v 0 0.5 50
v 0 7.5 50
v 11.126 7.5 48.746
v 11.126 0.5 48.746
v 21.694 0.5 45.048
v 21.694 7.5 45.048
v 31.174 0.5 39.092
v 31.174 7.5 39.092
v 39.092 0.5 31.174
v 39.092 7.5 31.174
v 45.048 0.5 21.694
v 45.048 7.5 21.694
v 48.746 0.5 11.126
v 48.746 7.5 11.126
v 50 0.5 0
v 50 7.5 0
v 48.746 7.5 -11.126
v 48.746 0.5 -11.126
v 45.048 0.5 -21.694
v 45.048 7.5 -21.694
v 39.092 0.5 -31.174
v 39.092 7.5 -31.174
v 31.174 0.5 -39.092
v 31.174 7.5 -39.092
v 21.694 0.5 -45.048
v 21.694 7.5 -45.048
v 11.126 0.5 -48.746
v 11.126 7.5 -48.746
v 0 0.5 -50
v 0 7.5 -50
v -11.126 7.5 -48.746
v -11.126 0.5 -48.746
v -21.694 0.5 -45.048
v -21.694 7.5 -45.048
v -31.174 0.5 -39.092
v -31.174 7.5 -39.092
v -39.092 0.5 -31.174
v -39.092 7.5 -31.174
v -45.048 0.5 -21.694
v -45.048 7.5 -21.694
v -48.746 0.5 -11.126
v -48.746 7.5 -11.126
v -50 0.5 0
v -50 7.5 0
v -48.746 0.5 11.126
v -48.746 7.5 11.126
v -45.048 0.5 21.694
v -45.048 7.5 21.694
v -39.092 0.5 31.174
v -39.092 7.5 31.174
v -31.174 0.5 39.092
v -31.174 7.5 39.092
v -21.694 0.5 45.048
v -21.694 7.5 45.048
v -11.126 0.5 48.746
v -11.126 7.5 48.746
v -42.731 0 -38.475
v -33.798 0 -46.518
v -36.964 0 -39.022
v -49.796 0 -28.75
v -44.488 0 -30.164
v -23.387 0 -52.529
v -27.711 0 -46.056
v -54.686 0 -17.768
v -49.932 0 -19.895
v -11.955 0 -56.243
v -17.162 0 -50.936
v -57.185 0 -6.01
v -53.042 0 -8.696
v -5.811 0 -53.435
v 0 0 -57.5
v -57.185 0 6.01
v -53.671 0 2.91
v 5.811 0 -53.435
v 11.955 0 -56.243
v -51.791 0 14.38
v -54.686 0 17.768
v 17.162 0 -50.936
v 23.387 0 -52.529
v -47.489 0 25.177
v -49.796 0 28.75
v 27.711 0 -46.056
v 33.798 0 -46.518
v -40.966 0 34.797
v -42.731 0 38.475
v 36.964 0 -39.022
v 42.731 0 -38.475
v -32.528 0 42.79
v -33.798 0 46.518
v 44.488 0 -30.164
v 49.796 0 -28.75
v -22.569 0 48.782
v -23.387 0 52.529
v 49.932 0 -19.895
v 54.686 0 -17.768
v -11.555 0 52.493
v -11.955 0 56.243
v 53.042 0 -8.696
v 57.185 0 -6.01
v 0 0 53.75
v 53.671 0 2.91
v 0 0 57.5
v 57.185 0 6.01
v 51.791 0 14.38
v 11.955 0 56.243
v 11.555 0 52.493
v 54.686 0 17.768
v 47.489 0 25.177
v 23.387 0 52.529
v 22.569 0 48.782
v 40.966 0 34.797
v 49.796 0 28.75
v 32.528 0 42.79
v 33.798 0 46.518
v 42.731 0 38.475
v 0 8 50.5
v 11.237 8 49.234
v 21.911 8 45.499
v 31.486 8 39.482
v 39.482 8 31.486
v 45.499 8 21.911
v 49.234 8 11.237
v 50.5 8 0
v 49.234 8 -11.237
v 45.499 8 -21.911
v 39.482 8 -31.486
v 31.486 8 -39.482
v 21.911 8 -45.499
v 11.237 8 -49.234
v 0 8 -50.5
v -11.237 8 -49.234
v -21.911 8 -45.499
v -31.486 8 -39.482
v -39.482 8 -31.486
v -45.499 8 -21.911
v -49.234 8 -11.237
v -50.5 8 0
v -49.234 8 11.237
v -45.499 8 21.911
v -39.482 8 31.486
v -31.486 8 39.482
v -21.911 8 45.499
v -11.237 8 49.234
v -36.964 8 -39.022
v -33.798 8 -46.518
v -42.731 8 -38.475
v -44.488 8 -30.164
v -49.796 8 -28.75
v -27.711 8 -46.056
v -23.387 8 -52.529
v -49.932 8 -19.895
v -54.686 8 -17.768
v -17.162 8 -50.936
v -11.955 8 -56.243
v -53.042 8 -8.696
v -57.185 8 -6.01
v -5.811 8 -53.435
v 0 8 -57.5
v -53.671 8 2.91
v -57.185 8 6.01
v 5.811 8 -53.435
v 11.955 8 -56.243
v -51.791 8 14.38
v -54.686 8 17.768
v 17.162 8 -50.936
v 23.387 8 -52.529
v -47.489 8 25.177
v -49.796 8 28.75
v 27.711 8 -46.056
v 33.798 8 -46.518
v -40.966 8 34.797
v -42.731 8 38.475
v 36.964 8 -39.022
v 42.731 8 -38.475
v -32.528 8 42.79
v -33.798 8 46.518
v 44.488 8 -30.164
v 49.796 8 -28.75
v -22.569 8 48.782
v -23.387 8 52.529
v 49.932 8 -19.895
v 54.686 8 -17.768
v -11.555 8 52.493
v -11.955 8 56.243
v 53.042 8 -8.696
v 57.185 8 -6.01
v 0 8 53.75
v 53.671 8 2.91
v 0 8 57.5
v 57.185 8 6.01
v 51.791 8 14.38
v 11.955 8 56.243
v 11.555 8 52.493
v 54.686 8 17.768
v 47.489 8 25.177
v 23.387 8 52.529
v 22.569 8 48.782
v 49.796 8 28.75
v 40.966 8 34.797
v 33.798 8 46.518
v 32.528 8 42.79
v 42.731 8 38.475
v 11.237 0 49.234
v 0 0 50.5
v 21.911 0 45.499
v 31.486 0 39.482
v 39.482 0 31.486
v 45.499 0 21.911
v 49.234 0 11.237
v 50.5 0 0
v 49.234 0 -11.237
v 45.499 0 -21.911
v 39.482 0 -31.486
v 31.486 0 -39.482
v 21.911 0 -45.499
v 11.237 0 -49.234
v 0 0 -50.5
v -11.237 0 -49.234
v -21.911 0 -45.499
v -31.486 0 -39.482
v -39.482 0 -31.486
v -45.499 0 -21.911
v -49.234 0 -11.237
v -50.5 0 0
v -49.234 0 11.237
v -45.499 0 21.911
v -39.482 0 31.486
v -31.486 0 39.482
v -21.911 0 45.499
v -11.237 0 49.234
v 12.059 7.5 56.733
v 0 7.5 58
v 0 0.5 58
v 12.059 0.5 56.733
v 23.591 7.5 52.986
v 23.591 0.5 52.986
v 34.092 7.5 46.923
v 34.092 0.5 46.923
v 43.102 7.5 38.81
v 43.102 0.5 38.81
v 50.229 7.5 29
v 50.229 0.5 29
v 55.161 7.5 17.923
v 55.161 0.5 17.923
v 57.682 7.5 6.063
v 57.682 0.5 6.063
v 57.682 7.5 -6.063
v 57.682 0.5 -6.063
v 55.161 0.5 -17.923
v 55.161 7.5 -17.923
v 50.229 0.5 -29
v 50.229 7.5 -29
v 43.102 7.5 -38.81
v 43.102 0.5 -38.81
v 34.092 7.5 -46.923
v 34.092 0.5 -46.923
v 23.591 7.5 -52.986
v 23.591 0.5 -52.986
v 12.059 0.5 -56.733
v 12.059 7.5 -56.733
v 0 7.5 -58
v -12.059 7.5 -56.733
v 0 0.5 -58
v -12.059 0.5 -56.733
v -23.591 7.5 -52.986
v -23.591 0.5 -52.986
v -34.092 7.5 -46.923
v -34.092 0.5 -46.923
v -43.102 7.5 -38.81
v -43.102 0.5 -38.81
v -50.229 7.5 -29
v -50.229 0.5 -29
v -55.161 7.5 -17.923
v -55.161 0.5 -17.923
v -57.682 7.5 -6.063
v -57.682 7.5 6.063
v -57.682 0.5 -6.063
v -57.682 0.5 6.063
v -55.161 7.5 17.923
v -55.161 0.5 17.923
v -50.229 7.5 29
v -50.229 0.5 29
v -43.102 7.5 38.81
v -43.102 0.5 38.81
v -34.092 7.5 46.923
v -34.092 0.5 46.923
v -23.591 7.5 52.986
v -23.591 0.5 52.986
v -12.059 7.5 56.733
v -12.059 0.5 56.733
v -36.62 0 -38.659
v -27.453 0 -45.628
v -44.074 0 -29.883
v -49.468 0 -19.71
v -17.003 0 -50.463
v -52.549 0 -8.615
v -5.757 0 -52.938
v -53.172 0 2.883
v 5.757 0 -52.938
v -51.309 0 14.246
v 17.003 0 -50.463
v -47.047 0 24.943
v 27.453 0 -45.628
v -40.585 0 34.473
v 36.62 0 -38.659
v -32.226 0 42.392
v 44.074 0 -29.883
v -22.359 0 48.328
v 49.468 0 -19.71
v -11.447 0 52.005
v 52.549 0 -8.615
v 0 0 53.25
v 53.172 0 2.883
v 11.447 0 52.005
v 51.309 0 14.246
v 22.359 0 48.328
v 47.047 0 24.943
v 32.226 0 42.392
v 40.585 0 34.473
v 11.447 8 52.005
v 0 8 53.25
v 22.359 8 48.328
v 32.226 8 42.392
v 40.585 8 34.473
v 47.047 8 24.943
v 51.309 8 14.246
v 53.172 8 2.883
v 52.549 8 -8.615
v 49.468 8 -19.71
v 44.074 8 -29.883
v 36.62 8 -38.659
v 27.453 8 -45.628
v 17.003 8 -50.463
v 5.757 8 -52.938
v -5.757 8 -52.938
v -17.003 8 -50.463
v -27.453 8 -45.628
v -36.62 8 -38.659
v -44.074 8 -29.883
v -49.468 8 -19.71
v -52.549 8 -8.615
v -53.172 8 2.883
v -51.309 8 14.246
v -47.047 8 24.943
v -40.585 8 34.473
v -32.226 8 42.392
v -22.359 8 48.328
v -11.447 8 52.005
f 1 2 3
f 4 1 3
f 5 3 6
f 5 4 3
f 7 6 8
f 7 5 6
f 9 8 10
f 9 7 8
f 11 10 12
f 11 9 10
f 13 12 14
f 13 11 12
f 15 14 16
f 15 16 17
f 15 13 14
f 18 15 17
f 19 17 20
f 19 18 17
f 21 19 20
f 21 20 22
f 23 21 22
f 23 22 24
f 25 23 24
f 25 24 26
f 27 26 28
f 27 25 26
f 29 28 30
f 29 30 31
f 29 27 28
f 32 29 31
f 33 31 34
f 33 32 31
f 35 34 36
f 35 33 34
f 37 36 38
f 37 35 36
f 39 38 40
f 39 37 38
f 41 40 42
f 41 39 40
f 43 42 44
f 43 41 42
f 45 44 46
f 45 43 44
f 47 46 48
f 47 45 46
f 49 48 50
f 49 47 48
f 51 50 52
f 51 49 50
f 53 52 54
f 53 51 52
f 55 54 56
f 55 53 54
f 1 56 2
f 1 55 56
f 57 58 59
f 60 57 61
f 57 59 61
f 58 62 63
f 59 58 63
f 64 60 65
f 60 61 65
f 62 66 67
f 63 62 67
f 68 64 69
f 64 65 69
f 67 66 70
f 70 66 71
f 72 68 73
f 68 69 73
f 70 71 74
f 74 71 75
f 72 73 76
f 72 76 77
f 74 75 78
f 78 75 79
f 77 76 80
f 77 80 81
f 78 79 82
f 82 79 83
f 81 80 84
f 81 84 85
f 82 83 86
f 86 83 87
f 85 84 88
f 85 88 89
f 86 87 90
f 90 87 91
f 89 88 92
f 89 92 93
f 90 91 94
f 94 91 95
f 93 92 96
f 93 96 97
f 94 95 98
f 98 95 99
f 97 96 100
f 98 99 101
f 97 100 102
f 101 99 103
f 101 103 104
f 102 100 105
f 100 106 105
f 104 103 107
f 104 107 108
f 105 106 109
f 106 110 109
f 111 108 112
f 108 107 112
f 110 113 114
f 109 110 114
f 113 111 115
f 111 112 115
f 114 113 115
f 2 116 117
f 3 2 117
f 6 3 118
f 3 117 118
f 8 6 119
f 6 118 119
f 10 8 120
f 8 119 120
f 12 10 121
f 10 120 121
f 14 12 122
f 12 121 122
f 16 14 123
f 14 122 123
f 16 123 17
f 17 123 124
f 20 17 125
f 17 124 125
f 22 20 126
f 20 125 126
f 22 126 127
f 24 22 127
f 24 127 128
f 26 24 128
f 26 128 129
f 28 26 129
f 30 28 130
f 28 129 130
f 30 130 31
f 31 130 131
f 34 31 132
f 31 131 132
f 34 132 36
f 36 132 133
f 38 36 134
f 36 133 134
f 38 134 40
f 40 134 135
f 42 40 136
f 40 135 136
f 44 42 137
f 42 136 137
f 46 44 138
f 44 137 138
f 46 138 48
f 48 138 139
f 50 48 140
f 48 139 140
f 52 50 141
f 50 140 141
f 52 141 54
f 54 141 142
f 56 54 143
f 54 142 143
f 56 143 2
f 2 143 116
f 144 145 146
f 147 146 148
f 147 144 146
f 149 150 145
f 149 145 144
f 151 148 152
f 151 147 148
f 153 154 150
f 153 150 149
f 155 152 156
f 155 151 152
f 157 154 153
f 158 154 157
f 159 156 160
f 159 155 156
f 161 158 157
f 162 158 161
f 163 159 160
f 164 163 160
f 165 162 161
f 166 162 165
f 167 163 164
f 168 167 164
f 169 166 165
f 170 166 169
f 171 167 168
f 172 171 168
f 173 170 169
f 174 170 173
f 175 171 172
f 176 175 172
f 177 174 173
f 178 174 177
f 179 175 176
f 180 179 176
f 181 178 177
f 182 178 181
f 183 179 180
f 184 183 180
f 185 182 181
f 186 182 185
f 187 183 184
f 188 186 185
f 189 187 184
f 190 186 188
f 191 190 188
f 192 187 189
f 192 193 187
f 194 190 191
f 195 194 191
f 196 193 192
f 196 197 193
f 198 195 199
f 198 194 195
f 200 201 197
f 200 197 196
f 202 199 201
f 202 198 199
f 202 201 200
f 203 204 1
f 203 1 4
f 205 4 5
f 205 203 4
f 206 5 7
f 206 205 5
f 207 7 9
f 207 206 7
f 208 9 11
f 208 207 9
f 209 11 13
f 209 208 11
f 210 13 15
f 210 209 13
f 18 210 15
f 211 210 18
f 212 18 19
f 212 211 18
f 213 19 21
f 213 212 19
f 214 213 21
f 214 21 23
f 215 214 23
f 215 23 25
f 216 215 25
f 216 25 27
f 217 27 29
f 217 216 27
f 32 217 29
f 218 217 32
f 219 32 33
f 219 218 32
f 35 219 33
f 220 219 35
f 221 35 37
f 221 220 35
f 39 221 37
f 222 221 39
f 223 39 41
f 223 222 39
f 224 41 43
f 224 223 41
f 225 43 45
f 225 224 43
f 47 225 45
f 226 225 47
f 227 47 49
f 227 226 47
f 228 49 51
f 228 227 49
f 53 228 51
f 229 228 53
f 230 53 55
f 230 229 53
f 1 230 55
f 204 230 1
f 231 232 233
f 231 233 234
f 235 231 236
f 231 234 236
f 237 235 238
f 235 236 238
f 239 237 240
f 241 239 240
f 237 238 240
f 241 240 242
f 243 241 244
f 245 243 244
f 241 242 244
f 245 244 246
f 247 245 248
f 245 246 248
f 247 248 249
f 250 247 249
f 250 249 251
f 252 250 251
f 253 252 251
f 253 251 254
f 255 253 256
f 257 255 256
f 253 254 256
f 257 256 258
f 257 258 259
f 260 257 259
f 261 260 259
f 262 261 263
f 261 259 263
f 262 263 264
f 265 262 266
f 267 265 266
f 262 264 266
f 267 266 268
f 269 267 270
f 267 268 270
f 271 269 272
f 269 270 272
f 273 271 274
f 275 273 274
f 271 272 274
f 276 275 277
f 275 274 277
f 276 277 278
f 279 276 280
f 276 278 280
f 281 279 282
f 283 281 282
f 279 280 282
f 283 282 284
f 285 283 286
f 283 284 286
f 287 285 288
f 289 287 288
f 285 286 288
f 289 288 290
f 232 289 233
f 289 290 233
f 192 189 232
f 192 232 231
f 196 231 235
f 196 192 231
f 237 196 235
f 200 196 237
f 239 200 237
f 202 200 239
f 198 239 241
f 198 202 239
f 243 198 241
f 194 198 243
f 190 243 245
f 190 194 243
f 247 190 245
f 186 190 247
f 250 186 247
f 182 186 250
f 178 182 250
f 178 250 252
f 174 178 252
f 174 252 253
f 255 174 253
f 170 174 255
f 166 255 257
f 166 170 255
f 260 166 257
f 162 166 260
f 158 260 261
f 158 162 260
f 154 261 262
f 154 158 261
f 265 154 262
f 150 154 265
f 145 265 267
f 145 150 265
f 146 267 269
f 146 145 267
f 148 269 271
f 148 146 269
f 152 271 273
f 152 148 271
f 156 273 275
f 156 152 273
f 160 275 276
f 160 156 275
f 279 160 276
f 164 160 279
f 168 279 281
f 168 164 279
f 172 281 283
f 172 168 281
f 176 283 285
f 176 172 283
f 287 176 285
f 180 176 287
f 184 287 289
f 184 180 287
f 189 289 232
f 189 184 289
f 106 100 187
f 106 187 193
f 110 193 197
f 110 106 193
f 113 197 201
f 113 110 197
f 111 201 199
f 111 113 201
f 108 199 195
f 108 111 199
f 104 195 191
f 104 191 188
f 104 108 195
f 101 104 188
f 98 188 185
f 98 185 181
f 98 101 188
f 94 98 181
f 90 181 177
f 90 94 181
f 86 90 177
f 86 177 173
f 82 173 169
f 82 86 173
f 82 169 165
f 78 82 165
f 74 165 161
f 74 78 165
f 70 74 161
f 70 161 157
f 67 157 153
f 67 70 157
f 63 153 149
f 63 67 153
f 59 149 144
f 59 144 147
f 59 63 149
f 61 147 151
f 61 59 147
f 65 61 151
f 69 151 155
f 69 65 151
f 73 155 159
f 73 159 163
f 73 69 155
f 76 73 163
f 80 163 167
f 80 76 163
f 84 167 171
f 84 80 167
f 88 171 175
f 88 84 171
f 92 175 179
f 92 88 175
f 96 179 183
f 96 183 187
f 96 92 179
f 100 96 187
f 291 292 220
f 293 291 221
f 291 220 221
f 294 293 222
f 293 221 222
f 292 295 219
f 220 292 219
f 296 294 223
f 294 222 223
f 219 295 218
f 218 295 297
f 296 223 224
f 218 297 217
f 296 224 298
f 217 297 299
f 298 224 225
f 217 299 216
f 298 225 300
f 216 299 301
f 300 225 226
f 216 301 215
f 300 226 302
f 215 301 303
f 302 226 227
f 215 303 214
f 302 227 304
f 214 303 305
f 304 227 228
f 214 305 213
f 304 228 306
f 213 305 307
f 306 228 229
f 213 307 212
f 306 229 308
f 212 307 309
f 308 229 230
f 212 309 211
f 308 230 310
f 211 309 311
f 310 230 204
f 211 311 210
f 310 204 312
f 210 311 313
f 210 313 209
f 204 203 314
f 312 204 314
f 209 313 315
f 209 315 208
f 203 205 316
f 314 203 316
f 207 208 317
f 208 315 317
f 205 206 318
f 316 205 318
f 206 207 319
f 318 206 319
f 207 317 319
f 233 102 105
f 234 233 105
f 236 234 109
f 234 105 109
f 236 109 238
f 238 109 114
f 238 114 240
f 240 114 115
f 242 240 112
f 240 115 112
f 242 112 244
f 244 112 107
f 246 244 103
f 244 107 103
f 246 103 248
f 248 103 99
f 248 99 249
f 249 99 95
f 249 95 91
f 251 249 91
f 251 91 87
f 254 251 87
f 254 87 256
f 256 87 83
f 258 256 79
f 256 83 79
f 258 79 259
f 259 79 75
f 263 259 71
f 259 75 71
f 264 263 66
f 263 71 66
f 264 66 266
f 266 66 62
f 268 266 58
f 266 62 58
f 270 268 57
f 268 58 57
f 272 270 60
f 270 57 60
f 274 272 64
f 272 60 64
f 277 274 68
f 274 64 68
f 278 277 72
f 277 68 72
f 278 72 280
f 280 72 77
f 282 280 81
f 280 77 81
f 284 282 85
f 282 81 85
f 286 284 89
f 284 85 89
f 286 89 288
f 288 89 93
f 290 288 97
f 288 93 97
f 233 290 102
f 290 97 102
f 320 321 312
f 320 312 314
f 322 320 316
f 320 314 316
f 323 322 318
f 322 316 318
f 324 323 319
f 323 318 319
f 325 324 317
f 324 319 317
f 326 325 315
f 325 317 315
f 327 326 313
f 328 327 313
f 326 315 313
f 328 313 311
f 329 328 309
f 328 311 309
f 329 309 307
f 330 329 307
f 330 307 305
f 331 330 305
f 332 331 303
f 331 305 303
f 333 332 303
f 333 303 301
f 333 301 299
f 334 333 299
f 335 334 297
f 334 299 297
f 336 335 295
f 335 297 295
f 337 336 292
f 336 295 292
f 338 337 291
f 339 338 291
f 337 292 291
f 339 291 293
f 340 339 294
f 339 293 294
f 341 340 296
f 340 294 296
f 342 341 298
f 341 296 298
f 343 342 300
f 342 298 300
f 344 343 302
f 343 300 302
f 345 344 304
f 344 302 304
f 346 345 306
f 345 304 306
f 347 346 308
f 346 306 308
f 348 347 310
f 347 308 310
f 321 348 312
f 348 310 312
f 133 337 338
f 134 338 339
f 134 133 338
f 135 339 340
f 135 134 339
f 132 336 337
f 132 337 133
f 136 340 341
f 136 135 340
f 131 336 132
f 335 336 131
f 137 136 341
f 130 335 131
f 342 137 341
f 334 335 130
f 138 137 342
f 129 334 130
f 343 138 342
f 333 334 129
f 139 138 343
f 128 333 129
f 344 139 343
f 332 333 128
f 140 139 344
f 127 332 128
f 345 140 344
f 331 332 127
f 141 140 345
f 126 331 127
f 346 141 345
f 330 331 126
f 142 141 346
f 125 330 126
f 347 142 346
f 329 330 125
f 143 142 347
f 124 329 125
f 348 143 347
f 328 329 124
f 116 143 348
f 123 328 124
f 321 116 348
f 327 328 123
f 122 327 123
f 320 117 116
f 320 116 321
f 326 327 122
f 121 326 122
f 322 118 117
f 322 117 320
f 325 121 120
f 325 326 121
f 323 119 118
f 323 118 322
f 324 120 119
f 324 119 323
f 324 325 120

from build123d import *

# Parameters (mm, degrees)
SKETCH_1_R      = 58
SKETCH_1_R_2    = 53.75
EXTRUDE_1_DEPTH = 8
SKETCH_2_R      = 53.25
SKETCH_2_R_2    = 50
EXTRUDE_2_DEPTH = 8
CHAMFER_1_SIZE  = 0.5
CHAMFER_2_SIZE  = 0.5


with BuildPart() as part:
    # 草图1 → 凸台-拉伸1 (new body)
    with BuildSketch(Plane(origin=(0, 0, 0), x_dir=(1, 0, 0), z_dir=(0, 1, 0))):
        with Locations(Location((0, 0, 0), (0, 0, 270))):
            Circle(SKETCH_1_R)
        with Locations(Location((0, 0, 0), (0, 0, 270))):
            Circle(SKETCH_1_R_2, mode=Mode.SUBTRACT)
    extrude(amount=EXTRUDE_1_DEPTH)

    # 倒角1
    chamfer_1_edges = [part.edges().sort_by_distance(p)[0] for p in [
        (0, 0, -58),
        (0, 8, -58),
    ]]
    chamfer(chamfer_1_edges, length=CHAMFER_1_SIZE)


with BuildPart() as body_2:
    # 草图2 → 凸台-拉伸2 (new body)
    with BuildSketch(Plane(origin=(0, 0, 0), x_dir=(1, 0, 0), z_dir=(0, 1, 0))):
        with Locations(Location((0, 0, 0), (0, 0, 270))):
            Circle(SKETCH_2_R)
        with Locations(Location((0, 0, 0), (0, 0, 270))):
            Circle(SKETCH_2_R_2, mode=Mode.SUBTRACT)
    extrude(amount=EXTRUDE_2_DEPTH)

    # 倒角2
    chamfer_2_edges = [body_2.edges().sort_by_distance(p)[0] for p in [
        (0, 0, -50),
        (0, 8, -50),
    ]]
    chamfer(chamfer_2_edges, length=CHAMFER_2_SIZE)


solid = Compound([part.part, body_2.part])
